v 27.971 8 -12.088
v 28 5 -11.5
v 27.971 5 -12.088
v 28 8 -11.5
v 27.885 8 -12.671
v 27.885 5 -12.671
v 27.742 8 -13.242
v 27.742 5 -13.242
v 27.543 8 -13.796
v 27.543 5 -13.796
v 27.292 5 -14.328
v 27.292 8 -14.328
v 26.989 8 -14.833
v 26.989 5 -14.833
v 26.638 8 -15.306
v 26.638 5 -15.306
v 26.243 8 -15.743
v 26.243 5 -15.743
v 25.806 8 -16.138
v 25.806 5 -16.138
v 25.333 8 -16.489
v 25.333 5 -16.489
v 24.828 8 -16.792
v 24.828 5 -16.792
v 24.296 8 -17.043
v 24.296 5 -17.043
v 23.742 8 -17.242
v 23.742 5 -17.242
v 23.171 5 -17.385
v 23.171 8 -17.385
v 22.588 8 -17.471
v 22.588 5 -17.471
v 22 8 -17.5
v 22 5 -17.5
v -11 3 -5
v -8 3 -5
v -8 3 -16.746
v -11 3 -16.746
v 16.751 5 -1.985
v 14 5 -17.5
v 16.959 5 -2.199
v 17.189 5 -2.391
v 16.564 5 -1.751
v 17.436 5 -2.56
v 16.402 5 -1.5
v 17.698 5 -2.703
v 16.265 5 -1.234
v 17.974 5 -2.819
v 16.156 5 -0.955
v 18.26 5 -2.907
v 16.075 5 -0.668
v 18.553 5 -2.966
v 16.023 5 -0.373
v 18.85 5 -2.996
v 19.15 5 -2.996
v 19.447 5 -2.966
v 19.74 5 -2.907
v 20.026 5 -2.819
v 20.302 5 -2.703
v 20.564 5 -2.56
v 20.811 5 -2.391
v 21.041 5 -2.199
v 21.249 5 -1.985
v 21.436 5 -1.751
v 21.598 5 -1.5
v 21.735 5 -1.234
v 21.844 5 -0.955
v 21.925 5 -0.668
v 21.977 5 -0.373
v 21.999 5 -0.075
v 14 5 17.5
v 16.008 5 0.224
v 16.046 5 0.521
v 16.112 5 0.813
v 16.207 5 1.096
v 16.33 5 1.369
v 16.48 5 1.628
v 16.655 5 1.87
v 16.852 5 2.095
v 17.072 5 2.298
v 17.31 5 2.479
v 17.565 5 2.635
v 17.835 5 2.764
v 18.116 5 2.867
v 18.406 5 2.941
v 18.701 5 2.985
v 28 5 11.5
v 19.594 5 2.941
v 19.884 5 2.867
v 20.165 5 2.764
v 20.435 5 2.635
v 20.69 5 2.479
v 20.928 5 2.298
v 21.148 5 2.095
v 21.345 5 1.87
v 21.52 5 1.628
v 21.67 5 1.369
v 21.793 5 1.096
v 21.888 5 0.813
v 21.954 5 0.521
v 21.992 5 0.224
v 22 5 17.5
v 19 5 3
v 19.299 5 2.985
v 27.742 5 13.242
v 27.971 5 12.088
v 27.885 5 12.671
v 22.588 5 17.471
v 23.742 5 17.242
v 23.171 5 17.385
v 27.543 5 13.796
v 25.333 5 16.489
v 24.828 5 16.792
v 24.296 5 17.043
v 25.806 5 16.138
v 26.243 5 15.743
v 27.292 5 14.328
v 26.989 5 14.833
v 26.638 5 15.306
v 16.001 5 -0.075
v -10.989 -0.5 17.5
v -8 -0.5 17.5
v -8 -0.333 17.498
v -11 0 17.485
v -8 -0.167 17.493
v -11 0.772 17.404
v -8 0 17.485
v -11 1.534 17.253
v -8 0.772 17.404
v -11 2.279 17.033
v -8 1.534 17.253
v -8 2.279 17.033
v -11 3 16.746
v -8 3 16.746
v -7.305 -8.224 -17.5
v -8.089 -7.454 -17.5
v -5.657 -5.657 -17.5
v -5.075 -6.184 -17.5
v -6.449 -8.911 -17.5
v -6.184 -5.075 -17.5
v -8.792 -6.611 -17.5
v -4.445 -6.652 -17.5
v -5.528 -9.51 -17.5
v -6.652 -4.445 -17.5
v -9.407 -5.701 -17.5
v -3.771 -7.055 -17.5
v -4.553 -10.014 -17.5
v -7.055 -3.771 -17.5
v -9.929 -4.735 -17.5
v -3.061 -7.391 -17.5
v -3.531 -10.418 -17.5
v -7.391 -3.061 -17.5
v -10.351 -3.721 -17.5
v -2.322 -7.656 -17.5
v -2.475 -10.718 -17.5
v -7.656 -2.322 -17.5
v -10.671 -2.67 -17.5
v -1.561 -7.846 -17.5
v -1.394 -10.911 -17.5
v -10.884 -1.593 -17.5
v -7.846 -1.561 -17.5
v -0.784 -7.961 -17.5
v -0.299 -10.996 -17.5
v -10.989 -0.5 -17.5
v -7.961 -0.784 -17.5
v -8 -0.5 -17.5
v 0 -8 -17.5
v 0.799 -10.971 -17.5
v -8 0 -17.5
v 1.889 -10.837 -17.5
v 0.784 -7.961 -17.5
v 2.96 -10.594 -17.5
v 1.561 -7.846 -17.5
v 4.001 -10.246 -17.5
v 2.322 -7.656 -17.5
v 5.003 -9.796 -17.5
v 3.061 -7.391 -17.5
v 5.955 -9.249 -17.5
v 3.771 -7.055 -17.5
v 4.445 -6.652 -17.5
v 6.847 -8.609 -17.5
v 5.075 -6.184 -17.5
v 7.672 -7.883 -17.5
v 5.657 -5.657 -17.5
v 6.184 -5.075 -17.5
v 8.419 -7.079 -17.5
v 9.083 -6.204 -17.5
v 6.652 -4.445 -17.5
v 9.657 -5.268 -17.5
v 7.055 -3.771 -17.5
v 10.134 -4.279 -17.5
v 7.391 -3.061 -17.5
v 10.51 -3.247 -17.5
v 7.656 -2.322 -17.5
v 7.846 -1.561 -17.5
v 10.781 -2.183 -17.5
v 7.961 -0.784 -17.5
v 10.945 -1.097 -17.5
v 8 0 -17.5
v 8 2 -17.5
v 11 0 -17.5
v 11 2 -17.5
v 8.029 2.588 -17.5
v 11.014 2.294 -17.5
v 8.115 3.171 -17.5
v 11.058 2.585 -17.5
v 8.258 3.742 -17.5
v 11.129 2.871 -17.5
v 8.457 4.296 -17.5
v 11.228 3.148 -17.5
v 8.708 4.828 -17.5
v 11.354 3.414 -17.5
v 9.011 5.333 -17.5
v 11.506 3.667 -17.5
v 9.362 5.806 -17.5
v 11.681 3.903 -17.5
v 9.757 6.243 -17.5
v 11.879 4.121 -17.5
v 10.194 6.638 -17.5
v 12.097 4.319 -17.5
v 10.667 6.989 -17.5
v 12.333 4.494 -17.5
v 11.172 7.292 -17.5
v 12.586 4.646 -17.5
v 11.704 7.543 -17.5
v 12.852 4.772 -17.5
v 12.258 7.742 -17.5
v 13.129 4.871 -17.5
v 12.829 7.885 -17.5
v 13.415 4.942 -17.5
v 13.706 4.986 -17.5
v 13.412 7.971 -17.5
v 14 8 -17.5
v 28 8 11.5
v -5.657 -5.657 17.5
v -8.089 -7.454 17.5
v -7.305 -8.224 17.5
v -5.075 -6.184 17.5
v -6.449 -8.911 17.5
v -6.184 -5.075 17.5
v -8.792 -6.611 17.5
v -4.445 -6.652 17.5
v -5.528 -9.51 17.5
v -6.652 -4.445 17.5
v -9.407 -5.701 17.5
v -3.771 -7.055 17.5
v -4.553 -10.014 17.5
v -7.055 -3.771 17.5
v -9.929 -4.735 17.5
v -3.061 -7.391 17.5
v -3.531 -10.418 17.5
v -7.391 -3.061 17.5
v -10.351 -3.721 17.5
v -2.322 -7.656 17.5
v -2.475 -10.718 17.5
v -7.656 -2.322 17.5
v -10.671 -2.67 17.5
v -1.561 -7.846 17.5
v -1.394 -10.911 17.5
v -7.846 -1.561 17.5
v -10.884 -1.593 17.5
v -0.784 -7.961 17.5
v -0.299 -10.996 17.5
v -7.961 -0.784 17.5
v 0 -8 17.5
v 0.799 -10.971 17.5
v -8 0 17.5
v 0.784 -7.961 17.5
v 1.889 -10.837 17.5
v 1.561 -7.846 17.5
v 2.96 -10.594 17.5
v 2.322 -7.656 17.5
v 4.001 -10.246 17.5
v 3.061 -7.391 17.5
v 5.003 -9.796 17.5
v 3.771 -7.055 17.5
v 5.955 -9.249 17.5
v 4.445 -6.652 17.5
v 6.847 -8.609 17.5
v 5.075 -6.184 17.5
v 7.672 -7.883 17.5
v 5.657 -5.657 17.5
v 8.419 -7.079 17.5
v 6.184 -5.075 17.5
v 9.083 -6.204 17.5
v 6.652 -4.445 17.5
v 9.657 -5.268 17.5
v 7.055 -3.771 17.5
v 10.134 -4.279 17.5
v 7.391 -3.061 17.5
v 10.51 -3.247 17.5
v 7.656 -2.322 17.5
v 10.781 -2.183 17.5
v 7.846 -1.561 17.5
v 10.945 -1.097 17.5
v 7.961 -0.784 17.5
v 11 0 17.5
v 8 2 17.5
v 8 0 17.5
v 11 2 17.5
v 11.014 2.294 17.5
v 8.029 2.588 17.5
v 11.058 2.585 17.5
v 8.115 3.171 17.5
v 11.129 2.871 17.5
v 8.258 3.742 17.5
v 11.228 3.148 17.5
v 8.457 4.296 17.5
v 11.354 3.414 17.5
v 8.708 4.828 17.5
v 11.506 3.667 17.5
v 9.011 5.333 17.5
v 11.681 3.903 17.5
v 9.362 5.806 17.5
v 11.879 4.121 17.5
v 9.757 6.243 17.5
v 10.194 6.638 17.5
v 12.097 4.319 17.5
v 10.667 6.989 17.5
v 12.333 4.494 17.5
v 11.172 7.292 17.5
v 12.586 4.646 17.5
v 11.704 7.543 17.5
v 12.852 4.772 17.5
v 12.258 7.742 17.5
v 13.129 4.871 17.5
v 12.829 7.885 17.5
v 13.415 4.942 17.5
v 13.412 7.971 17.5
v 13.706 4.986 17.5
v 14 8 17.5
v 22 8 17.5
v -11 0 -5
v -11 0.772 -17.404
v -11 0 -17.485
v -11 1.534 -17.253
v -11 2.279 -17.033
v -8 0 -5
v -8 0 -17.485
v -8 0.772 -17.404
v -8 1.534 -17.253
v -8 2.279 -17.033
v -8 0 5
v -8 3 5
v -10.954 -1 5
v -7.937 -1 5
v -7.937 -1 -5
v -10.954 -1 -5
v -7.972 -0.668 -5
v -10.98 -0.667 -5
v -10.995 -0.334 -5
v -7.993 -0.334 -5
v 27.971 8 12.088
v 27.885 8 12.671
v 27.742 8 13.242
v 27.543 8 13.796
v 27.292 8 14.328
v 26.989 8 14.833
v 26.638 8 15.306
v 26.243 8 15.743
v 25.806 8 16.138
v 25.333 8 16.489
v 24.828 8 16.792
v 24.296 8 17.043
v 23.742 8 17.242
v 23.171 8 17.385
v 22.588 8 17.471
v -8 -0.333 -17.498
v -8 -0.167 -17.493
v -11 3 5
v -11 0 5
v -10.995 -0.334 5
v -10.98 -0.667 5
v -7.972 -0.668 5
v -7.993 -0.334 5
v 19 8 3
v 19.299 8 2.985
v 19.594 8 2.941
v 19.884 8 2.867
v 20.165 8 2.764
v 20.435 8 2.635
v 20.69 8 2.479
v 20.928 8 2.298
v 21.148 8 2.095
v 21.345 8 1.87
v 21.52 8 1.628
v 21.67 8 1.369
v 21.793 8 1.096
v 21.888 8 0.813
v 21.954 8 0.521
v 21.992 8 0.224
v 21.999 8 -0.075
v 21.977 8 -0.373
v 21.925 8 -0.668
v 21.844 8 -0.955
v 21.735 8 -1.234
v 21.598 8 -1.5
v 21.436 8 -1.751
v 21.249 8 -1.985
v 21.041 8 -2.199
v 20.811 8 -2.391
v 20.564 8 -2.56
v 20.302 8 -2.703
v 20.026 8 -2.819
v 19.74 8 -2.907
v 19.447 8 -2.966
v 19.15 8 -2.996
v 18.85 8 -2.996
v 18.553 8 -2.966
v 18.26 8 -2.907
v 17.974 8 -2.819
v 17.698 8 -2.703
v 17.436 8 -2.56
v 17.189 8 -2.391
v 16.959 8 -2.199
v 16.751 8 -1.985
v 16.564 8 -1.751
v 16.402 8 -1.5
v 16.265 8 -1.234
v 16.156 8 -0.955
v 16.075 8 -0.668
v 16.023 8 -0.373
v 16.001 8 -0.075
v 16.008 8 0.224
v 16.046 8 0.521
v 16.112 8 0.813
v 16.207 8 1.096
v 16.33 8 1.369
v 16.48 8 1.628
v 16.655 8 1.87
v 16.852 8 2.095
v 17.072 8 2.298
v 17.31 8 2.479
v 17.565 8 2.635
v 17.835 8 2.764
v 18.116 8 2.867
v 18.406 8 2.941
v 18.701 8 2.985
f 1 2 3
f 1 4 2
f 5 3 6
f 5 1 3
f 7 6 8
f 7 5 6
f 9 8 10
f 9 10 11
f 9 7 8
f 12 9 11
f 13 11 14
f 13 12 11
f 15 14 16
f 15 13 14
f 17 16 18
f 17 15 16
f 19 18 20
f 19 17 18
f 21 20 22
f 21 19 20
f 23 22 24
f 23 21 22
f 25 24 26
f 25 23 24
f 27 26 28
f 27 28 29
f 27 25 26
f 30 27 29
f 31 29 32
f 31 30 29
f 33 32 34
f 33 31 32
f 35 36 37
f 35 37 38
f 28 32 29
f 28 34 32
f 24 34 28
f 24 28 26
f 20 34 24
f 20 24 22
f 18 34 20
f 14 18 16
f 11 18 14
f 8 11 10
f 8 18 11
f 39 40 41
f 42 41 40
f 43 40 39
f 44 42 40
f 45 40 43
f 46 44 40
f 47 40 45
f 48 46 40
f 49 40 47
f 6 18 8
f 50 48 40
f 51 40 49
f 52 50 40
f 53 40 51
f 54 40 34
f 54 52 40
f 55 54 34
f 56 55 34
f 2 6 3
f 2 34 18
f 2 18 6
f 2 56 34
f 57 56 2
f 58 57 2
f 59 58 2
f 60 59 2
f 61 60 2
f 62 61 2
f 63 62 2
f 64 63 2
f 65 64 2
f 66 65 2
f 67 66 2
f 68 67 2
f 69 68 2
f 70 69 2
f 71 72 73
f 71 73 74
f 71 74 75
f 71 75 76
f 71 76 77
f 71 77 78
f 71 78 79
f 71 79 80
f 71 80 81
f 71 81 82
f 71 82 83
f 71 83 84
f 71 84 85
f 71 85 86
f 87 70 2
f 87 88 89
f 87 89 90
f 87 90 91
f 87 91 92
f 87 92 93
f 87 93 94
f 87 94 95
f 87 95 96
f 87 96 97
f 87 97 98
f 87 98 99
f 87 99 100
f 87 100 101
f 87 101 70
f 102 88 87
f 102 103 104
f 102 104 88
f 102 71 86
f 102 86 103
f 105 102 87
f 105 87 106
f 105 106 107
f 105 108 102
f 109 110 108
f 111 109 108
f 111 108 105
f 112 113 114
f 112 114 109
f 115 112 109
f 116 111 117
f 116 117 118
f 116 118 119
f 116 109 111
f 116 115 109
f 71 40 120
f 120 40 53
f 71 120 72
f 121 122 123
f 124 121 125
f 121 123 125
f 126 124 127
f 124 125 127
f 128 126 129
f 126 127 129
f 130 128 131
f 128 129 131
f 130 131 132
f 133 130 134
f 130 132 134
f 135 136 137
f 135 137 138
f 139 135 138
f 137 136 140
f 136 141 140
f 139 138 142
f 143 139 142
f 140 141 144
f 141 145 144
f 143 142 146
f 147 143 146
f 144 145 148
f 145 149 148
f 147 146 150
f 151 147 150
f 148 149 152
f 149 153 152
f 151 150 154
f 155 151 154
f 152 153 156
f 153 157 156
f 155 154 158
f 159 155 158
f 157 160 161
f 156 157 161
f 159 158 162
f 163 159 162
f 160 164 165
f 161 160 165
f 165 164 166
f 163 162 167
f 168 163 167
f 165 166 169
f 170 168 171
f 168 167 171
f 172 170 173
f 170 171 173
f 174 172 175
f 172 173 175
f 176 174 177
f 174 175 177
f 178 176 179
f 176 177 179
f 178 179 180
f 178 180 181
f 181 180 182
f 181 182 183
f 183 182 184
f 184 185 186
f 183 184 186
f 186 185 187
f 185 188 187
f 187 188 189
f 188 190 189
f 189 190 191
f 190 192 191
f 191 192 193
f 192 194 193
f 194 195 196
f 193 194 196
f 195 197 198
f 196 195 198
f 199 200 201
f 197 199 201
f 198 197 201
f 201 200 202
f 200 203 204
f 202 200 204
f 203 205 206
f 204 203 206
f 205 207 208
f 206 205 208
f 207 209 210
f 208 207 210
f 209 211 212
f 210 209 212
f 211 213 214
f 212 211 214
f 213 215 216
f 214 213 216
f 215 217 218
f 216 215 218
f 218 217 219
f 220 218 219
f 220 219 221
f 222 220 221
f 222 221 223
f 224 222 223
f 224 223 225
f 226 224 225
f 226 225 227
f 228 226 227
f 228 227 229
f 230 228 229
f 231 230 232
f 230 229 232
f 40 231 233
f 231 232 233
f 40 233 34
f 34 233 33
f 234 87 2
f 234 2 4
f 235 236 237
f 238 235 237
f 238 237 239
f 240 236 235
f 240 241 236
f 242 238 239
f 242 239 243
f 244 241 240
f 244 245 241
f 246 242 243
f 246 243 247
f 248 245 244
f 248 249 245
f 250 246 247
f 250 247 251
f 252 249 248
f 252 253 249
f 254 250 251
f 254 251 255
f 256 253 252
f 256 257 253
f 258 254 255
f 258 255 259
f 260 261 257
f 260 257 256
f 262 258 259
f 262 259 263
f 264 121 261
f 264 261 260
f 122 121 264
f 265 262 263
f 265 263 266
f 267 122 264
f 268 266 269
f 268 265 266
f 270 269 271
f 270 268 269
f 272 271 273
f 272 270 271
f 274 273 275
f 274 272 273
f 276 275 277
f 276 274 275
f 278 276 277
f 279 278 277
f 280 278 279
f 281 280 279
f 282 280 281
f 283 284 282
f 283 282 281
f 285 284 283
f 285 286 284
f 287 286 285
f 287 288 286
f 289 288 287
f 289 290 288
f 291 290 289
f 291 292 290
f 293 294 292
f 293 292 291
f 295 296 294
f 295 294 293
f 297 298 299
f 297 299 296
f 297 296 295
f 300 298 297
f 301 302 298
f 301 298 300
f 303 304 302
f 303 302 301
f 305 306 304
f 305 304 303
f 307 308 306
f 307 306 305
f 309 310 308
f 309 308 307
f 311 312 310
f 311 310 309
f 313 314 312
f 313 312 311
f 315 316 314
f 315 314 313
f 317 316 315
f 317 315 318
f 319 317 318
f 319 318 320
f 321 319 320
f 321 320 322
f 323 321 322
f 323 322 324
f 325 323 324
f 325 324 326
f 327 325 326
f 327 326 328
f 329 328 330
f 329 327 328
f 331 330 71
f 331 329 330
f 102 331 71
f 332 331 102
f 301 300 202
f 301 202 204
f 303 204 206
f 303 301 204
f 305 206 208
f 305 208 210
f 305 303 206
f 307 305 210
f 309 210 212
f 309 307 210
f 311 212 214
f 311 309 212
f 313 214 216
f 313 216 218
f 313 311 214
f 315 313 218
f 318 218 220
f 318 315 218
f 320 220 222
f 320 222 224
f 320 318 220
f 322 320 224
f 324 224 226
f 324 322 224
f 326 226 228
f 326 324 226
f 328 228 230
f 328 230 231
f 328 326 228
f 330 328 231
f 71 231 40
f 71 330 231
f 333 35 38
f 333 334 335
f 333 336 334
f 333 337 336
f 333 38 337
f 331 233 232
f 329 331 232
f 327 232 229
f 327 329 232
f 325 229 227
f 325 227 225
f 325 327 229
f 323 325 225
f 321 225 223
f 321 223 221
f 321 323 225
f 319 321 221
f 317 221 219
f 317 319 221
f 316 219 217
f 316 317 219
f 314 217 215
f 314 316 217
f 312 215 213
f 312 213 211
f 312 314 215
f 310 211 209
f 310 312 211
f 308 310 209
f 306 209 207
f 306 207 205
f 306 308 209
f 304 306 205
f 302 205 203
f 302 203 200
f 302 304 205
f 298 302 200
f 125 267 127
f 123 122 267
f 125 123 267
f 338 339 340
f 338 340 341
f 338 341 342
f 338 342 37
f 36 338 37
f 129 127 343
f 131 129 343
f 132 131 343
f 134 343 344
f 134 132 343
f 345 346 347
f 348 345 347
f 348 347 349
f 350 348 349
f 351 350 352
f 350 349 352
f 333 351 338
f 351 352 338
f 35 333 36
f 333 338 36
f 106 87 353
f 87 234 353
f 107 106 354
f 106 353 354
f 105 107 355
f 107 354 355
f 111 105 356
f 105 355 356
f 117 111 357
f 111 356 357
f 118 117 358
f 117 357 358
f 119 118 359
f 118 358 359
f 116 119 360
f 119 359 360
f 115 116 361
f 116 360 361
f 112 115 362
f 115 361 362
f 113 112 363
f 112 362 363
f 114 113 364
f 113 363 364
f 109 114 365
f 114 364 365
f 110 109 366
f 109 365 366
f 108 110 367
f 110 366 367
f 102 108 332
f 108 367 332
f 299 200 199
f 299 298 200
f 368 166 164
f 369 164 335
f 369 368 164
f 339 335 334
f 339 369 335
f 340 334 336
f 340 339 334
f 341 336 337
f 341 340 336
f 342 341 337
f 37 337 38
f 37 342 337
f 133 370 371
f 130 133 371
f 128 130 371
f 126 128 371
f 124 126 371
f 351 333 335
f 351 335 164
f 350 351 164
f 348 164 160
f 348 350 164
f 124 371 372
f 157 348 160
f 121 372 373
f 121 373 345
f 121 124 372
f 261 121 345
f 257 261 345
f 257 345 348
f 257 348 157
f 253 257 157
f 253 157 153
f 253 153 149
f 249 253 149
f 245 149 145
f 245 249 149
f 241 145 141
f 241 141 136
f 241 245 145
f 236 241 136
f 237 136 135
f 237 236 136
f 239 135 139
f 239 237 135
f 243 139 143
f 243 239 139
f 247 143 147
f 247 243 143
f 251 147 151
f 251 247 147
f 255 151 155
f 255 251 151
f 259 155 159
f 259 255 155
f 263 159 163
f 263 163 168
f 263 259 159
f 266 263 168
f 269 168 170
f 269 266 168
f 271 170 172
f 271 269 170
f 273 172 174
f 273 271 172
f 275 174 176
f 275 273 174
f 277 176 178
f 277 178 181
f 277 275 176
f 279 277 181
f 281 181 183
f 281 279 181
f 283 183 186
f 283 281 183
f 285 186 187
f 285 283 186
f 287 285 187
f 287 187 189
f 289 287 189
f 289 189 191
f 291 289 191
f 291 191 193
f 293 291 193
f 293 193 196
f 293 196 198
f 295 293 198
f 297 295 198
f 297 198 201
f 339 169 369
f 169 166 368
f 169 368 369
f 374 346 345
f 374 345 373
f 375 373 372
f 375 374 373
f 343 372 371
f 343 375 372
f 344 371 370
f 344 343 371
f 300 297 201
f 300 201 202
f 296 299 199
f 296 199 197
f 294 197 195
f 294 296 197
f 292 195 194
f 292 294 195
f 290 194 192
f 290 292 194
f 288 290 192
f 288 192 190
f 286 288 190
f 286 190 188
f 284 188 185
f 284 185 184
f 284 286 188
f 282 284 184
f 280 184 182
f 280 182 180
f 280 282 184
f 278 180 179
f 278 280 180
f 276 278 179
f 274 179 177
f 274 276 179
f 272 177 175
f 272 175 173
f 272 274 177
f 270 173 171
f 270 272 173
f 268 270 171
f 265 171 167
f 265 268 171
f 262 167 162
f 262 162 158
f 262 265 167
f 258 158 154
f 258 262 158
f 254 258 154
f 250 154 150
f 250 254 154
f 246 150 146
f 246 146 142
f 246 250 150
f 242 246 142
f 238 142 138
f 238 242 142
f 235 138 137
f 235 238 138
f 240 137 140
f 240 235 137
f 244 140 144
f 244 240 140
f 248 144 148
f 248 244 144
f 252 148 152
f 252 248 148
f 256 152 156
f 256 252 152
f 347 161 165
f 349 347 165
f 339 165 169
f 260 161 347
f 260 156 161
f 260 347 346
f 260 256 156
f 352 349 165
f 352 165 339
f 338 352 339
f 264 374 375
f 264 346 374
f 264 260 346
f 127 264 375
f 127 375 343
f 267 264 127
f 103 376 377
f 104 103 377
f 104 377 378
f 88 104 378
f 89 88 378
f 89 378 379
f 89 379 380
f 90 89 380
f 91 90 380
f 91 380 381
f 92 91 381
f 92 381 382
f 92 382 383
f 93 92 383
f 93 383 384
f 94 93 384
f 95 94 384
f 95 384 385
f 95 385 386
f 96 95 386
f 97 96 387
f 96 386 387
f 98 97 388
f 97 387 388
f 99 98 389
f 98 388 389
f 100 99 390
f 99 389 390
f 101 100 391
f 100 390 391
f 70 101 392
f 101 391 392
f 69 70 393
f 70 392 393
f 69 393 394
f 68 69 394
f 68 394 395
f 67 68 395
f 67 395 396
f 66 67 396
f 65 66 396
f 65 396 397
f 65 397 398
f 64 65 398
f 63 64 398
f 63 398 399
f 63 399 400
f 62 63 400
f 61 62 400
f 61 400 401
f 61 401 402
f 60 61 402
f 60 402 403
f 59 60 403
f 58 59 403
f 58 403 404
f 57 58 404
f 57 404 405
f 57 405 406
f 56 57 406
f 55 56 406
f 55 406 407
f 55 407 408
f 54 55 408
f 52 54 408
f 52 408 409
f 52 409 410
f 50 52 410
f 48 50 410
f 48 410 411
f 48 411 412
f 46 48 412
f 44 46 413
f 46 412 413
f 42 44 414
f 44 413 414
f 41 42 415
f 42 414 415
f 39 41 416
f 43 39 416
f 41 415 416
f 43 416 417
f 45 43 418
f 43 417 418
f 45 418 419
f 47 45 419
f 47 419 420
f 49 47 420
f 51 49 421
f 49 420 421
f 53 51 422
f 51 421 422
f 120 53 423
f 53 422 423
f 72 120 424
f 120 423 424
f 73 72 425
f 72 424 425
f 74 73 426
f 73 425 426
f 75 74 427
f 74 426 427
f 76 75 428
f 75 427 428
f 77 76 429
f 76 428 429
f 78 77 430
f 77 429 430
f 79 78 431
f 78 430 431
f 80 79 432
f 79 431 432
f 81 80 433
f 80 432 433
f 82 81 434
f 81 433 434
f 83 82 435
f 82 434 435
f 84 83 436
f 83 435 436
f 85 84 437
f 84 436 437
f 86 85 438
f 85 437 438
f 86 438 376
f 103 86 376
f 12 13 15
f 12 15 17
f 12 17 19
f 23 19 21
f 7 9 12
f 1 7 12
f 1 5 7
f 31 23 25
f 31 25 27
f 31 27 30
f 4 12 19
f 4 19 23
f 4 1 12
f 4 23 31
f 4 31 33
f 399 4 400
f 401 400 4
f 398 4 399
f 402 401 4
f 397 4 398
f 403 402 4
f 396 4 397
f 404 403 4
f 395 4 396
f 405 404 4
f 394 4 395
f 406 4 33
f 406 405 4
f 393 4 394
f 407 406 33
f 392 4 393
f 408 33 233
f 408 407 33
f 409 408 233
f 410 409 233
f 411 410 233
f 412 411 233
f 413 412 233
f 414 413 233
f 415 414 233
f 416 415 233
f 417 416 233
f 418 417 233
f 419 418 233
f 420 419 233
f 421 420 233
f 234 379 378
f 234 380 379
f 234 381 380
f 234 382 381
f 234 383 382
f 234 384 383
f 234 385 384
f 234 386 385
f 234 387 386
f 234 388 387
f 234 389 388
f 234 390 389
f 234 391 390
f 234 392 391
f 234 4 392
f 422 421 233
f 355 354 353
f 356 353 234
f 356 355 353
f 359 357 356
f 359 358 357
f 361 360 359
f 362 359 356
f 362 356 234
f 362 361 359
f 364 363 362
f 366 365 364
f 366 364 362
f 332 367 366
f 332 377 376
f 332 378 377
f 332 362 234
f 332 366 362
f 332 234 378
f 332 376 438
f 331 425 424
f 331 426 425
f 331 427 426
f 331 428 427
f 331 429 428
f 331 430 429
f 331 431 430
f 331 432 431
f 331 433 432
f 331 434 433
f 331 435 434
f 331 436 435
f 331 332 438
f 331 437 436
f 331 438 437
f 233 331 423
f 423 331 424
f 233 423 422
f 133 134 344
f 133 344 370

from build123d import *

# Parameters (mm, degrees)
EXTRUSION1_DEPTH        = 17.5
CONG_1_R                = 6
ESQUISSE2_R             = 3
ENL_V_MAT_EXTRU_1_DEPTH = 20
ENL_V_MAT_EXTRU_6_DEPTH = 35
ESQUISSE4_W             = 10
ESQUISSE4_H             = 4
ENL_V_MAT_EXTRU_7_DEPTH = 12.0000001


with BuildPart() as part:
    # Esquisse1 → Extrusion1 (new body, symmetric)
    with BuildSketch(Plane.XY):
        with BuildLine():
            Line((8, 2), (8, 0))
            ThreePointArc((8, 0), (0, -8), (-8, 0))
            Line((-8, 0), (-8, 3))
            Line((-8, 3), (-11, 3))
            Line((-11, 3), (-11, 0))
            ThreePointArc((-11, 0), (0, -11), (11, 0))
            Line((11, 0), (11, 2))
            ThreePointArc((11, 2), (11.878679656, 4.121320344), (14, 5))
            Line((14, 5), (28, 5))
            Line((28, 5), (28, 8))
            Line((28, 8), (14, 8))
            ThreePointArc((14, 8), (9.757359313, 6.242640687), (8, 2))
        make_face()
    extrude(amount=EXTRUSION1_DEPTH, both=True)

    # Congé1
    cong_1_edges = [part.edges().sort_by_distance(p)[0] for p in [
        (28, 6.5, -17.5),
        (28, 6.5, 17.5),
    ]]
    fillet(cong_1_edges, radius=CONG_1_R)

    # Esquisse2 → Enlèv. mat.-Extru.1 (cut, through all)
    with BuildSketch(Plane(origin=(0, 8, 0), x_dir=(-1, 0, 0), z_dir=(0, 1, 0))):
        with Locations(Location((-19, 0, 0), (0, 0, 90))):  # turned: the seam where the file's is
            Circle(ESQUISSE2_R)
    extrude(amount=-ENL_V_MAT_EXTRU_1_DEPTH, mode=Mode.SUBTRACT)

    # Esquisse3 → Enlèv. mat.-Extru.6 (cut)
    with BuildSketch(Plane.ZY.offset(8)):
        with BuildLine():
            Line((-9, 8), (-17.5, 8))
            Line((-17.5, 8), (-17.5, -0.5))
            ThreePointArc((-17.5, -0.5), (-15.01040764, 5.51040764), (-9, 8))
        make_face()
        with BuildLine():
            Line((17.5, 8), (17.5, -0.5))
            ThreePointArc((17.5, -0.5), (15.01040764, 5.51040764), (9, 8))
            Line((9, 8), (17.5, 8))
        make_face()
    extrude(amount=ENL_V_MAT_EXTRU_6_DEPTH, mode=Mode.SUBTRACT)

    # Esquisse4 → Enlèv. mat.-Extru.7 (cut, through all)
    with BuildSketch(Plane(origin=(0, 0, 0), x_dir=(0, 0, -1), z_dir=(1, 0, 0))):
        with Locations((0, 1)):
            Rectangle(ESQUISSE4_W, ESQUISSE4_H)
    extrude(amount=-ENL_V_MAT_EXTRU_7_DEPTH, mode=Mode.SUBTRACT)


solid = part.part
